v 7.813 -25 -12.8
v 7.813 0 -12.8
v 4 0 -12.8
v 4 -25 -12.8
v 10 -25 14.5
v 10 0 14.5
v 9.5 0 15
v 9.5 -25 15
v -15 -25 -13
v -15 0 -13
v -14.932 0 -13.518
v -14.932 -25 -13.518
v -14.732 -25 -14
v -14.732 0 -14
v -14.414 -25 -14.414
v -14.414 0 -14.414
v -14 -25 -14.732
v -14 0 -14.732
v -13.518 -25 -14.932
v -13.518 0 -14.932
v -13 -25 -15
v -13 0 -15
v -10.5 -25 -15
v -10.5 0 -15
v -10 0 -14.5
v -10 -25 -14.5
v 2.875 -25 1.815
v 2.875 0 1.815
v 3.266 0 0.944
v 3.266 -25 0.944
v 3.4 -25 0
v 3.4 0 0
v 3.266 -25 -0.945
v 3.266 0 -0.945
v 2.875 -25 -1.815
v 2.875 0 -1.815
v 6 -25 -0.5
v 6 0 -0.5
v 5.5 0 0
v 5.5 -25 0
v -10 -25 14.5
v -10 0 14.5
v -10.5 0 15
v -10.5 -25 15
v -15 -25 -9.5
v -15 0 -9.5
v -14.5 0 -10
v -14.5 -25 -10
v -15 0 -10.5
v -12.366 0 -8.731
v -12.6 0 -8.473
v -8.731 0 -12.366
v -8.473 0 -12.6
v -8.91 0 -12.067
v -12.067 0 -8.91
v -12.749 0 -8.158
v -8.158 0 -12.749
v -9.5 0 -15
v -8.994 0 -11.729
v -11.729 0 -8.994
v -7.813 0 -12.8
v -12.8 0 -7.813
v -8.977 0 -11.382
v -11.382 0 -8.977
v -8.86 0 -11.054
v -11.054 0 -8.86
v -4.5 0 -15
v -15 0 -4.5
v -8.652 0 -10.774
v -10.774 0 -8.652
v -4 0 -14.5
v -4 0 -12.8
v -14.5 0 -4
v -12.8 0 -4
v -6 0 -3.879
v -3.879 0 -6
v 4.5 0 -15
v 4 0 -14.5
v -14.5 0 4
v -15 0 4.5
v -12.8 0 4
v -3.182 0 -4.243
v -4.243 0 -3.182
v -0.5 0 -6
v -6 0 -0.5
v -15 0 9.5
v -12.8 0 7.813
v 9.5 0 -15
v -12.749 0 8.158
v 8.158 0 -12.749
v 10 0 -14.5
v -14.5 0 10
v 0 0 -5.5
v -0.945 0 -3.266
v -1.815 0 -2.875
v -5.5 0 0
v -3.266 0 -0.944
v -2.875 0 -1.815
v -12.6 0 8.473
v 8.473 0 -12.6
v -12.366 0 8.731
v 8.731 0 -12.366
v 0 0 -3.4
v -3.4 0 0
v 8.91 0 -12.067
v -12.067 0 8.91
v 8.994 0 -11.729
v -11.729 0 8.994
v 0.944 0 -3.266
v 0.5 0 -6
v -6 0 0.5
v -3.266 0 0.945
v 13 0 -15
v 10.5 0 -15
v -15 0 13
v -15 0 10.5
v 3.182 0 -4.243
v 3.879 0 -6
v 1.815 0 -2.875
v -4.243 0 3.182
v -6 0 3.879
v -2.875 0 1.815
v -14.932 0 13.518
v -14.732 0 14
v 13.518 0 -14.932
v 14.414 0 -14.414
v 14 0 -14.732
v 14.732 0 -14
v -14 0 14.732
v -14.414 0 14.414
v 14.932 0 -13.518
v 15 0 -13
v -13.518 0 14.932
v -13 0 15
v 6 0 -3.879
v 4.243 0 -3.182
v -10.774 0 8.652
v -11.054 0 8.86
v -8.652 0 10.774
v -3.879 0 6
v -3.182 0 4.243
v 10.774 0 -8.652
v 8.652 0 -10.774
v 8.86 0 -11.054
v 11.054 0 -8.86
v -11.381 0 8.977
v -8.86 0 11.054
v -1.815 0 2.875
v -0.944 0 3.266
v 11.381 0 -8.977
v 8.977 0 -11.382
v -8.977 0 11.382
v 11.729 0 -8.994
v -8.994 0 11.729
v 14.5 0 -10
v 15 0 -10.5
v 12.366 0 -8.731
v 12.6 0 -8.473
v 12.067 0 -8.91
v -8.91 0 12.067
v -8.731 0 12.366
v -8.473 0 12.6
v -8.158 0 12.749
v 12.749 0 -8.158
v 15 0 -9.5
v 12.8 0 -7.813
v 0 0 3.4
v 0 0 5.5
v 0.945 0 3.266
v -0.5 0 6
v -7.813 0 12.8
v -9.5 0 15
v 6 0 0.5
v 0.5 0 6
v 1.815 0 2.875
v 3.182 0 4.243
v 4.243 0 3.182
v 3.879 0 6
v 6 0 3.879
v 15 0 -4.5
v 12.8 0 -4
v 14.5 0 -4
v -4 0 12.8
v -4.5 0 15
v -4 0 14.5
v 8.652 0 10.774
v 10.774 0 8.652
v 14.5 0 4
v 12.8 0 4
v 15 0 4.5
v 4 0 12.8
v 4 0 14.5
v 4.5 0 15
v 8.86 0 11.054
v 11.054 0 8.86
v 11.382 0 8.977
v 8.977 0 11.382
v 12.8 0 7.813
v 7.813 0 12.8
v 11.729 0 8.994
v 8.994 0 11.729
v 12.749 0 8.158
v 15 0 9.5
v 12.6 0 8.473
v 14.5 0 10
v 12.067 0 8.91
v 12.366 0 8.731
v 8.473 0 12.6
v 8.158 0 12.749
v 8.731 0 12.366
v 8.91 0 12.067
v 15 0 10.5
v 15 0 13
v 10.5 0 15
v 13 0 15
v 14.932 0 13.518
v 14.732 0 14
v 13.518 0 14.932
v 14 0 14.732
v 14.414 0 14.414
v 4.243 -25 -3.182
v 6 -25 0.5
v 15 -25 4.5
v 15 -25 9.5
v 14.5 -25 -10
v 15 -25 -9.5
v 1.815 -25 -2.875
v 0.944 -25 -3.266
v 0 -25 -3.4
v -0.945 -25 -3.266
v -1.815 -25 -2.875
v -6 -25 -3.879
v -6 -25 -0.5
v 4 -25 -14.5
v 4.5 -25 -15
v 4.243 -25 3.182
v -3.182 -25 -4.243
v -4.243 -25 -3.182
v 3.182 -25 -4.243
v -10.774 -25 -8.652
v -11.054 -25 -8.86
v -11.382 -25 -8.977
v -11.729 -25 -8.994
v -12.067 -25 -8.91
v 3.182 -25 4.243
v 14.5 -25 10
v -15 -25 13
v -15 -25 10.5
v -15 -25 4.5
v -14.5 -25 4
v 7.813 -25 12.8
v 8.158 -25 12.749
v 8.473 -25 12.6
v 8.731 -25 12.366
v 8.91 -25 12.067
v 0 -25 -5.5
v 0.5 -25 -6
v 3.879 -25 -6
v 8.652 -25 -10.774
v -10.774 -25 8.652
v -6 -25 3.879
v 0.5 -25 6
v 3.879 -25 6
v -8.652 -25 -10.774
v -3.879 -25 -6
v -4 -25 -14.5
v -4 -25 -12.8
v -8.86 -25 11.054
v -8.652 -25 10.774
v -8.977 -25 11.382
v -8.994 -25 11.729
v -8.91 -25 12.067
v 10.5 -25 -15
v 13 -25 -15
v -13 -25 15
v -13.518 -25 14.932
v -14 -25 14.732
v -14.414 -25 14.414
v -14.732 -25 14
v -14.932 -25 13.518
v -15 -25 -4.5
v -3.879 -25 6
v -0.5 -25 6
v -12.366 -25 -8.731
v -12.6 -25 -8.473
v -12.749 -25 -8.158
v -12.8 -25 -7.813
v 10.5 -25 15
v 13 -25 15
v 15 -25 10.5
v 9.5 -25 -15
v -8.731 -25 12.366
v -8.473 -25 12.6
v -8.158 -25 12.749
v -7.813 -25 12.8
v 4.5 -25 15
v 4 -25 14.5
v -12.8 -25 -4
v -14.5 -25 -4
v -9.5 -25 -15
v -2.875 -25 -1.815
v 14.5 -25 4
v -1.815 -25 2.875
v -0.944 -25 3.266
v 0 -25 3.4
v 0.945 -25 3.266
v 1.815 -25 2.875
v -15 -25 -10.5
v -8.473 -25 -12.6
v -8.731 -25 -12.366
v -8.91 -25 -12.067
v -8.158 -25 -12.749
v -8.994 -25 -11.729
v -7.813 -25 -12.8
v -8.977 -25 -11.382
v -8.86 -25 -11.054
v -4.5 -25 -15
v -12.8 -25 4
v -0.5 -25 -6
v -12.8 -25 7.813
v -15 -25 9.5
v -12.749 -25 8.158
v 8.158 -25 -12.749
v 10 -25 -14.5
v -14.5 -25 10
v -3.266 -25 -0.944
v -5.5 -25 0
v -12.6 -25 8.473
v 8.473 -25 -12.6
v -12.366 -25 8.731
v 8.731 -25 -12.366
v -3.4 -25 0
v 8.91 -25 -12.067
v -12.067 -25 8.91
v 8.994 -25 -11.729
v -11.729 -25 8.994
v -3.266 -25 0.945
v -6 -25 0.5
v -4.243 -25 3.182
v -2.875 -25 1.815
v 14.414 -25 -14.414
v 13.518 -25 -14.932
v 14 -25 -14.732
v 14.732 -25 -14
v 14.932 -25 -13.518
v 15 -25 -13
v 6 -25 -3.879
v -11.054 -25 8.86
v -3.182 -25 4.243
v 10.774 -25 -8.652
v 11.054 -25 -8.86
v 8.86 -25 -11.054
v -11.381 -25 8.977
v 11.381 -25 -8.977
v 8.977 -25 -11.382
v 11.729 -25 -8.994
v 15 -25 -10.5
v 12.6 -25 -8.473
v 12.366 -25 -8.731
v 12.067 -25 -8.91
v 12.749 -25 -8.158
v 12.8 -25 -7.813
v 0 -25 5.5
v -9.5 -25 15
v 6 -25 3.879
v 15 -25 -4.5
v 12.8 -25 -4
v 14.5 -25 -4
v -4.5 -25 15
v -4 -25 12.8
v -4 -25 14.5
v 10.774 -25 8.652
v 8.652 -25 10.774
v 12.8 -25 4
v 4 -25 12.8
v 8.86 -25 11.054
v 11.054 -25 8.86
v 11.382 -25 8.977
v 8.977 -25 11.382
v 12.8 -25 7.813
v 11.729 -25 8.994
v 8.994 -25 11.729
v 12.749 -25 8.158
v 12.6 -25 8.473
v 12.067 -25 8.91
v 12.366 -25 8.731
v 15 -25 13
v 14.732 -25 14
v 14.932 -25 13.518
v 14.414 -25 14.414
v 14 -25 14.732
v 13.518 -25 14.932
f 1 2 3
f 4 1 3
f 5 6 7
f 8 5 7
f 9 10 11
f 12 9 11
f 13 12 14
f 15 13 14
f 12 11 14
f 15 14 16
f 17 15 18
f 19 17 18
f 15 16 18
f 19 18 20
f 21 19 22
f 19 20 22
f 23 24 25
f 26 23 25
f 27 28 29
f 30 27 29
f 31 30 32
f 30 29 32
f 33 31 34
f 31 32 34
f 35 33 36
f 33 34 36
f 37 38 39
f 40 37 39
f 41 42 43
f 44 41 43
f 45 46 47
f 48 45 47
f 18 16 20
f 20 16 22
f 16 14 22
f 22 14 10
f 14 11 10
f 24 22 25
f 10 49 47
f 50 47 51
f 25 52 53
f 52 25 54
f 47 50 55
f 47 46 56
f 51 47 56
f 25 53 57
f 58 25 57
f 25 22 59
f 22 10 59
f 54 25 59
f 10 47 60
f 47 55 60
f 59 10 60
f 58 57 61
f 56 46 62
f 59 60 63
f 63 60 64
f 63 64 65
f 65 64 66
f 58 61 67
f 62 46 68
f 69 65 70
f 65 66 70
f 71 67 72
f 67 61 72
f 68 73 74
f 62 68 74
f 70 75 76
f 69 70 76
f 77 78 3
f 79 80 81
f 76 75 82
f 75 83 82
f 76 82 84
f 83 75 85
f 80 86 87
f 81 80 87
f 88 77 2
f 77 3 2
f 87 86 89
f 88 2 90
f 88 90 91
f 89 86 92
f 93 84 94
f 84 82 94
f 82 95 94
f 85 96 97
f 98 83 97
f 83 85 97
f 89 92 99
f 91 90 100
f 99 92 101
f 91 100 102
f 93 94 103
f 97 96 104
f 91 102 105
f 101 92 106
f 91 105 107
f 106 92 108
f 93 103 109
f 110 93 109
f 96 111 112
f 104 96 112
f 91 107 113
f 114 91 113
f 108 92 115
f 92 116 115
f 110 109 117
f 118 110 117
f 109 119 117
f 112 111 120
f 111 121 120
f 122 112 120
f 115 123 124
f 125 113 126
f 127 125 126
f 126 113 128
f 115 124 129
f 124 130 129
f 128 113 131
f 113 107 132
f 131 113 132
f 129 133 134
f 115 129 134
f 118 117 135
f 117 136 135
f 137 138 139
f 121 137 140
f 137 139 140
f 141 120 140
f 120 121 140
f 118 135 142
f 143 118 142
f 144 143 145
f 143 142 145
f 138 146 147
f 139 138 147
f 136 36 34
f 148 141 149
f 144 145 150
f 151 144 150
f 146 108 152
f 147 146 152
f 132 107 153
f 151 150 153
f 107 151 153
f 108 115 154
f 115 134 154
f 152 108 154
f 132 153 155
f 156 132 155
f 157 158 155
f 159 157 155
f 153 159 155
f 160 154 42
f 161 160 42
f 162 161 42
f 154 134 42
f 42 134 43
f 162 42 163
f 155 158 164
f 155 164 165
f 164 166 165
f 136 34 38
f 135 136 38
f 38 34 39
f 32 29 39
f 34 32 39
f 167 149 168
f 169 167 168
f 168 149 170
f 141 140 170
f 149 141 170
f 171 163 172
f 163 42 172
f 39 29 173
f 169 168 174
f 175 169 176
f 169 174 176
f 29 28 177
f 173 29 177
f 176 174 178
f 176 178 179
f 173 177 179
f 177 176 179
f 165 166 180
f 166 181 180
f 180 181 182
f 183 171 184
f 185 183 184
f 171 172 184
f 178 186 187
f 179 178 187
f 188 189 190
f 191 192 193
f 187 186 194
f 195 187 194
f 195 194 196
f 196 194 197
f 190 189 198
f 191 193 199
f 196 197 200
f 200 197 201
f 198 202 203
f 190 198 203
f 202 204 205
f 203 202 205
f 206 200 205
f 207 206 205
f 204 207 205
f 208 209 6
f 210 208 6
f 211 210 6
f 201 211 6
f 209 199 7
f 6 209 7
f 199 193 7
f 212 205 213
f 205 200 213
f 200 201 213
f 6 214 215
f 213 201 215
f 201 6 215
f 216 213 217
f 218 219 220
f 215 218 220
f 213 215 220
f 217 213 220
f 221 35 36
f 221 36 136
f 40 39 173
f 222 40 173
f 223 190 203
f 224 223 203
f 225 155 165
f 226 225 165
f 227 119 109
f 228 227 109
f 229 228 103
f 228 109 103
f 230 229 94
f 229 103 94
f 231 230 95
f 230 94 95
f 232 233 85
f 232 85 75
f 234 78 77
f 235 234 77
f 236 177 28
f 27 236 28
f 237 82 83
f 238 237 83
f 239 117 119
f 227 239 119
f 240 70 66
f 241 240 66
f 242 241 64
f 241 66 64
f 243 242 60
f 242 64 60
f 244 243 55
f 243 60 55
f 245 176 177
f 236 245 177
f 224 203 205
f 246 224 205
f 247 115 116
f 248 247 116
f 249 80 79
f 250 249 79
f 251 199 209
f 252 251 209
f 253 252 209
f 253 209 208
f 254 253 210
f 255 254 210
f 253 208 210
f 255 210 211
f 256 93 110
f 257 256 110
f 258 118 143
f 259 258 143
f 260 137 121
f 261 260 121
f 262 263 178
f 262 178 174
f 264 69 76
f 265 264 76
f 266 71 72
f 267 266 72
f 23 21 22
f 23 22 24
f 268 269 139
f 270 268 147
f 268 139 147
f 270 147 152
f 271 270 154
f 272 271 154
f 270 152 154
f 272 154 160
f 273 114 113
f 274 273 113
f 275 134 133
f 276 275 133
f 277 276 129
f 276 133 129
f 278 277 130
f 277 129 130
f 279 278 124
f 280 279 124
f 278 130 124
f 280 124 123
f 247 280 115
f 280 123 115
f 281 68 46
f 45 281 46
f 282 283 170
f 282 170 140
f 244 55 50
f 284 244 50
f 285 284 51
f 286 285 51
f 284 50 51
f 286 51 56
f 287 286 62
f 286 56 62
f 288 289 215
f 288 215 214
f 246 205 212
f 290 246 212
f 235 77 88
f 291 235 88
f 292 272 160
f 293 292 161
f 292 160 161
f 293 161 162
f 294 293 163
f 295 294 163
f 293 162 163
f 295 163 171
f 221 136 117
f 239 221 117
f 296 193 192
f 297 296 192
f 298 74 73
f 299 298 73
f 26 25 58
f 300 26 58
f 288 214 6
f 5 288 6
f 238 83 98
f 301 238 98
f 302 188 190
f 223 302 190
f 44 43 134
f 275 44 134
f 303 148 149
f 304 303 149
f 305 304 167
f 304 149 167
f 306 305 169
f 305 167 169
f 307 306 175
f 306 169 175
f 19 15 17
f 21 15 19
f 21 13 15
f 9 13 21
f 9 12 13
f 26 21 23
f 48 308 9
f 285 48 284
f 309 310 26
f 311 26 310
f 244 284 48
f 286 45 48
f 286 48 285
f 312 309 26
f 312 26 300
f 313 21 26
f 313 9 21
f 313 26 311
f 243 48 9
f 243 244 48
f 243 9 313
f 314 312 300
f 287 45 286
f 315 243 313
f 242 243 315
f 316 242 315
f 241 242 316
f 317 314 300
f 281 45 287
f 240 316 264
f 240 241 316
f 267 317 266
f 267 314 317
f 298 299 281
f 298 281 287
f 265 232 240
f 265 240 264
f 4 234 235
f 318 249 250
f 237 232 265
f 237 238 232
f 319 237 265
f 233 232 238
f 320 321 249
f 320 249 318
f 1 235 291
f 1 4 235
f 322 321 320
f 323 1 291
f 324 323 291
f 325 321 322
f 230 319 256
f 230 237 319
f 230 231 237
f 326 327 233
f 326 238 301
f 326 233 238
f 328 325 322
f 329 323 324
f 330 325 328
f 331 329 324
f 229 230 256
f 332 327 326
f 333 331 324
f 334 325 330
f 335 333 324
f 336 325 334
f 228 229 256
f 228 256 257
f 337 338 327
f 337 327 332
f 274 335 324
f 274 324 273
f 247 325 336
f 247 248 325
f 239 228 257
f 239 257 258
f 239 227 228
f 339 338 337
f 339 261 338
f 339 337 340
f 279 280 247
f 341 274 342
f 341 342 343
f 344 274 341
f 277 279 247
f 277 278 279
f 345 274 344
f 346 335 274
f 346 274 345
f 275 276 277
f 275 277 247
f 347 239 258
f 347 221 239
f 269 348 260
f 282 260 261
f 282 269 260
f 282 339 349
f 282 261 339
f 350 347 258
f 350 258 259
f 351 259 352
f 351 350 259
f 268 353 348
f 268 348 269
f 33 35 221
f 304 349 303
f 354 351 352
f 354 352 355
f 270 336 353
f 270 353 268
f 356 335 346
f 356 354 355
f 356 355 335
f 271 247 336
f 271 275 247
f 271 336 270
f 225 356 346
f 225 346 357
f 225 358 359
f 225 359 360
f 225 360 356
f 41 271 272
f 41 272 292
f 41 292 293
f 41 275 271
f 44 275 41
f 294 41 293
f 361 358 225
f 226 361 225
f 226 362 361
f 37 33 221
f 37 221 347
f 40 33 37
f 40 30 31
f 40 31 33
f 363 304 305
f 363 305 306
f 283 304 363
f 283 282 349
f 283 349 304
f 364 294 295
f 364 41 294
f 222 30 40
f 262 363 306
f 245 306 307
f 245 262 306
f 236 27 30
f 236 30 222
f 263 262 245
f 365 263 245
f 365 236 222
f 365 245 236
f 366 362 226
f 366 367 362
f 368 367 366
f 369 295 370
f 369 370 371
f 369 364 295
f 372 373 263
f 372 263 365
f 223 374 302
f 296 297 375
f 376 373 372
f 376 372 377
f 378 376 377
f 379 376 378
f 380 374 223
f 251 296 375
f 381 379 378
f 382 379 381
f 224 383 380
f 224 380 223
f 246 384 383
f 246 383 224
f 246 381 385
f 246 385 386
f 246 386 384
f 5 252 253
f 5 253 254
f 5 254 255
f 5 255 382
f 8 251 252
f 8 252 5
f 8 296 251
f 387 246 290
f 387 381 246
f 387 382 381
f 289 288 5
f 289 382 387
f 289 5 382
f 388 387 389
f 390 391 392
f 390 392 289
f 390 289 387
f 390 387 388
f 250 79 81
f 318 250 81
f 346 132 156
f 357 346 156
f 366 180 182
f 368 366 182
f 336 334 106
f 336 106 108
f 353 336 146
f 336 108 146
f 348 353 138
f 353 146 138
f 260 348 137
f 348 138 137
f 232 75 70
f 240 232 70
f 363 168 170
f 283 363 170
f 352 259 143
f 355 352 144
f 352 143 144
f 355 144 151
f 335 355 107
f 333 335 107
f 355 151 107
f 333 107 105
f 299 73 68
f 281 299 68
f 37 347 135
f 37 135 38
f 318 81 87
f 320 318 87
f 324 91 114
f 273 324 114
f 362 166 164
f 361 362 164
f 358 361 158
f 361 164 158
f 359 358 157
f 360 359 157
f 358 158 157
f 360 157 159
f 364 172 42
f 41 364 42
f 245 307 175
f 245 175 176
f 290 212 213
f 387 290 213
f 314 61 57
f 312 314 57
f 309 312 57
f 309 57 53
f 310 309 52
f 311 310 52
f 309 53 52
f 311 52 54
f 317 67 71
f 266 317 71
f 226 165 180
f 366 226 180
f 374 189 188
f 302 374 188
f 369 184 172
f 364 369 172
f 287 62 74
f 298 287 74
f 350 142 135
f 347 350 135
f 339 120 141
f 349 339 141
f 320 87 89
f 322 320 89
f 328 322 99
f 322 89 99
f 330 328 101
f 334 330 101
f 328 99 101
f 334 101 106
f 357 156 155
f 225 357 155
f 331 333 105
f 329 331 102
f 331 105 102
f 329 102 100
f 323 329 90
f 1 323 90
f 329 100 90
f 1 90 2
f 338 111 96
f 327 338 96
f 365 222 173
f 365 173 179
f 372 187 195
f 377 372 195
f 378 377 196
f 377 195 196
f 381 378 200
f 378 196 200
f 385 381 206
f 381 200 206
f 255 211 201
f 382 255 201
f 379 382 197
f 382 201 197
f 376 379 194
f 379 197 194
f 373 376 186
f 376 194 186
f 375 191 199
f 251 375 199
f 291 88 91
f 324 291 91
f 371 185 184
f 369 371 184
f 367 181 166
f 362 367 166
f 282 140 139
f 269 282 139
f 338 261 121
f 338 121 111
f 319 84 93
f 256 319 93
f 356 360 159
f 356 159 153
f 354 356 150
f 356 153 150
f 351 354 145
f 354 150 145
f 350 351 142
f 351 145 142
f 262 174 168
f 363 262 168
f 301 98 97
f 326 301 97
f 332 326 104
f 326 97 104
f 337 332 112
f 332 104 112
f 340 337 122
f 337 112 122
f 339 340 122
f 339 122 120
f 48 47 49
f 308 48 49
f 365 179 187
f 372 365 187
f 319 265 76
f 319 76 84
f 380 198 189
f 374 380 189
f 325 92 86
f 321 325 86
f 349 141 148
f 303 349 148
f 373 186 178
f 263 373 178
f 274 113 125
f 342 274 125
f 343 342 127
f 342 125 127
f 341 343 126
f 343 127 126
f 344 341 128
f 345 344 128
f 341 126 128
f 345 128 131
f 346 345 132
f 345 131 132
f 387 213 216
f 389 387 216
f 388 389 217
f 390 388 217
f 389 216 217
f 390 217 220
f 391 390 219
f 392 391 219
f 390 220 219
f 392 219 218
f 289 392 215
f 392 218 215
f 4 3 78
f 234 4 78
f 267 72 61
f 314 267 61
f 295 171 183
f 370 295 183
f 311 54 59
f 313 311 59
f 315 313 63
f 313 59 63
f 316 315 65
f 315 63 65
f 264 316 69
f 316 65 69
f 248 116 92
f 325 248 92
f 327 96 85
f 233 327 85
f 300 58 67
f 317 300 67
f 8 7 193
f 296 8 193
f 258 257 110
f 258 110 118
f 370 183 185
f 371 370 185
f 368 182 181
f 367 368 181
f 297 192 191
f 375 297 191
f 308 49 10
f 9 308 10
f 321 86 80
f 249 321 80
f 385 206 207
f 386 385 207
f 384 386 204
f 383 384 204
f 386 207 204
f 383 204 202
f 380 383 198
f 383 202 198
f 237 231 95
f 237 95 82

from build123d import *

# Parameters (mm, degrees)
F1_DEPTH = 25


# Not quite as in the source:
# - ends of sketch curves that miss each other by under 0.0002 mm in the source are joined


with BuildPart() as f1:
    # F0 (on Front) → F1 (new body)
    with BuildSketch(Plane.XZ):
        with BuildLine():
            ThreePointArc((-12.0672760652, 8.9096491574), (-11.3814883912, 8.9771930389), (-10.7737513132, 8.6523506868))
            Line((-10.7737513132, 8.6523506868), (-6, 3.8786))
            Line((-6, 3.8786), (-6, 0.5))
            Line((-6, 0.5), (-5.5, 0))
            Line((-5.5, 0), (-6, -0.5))
            Line((-6, -0.5), (-6, -3.8786))
            Line((-6, -3.8786), (-10.7738, -8.6524))
            ThreePointArc((-10.7738, -8.6524), (-11.3814883912, -8.9771930389), (-12.0672760652, -8.9096491574))
            ThreePointArc((-12.0672760652, -8.9096491574), (-12.5999492171, -8.4725051968), (-12.799999999, -7.8131))
            Line((-12.799999999, -7.8131), (-12.8, -4))
            Line((-12.8, -4), (-14.5, -4))
            Line((-14.5, -4), (-15, -4.5))
            Line((-15, -4.5), (-15, -9.5))
            Line((-15, -9.5), (-14.5, -10))
            Line((-14.5, -10), (-15, -10.5))
            Line((-15, -10.5), (-15, -13))
            ThreePointArc((-15, -13), (-14.4141844722, -14.4142216524), (-13, -15.0000239995))
            Line((-13, -15.0000239995), (-10.5, -15))
            Line((-10.5, -15), (-10, -14.5))
            Line((-10, -14.5), (-9.5, -15))
            Line((-9.5, -15), (-4.5, -15))
            Line((-4.5, -15), (-4, -14.5))
            Line((-4, -14.5), (-4, -12.8))
            Line((-4, -12.8), (-7.8131, -12.8))
            ThreePointArc((-7.8131, -12.8), (-8.4725048128, -12.5999494737), (-8.9096488038, -12.0672769187))
            ThreePointArc((-8.9096488038, -12.0672769187), (-8.977199798, -11.3815223738), (-8.6523996854, -10.7738003146))
            Line((-8.6523996854, -10.7738003146), (-3.8786, -6))
            Line((-3.8786, -6), (-0.5, -6))
            Line((-0.5, -6), (0, -5.5))
            Line((0, -5.5), (0.5, -6))
            Line((0.5, -6), (3.8786, -6))
            Line((3.8786, -6), (8.6524, -10.7738))
            ThreePointArc((8.6524, -10.7738), (8.977199798, -11.3815223738), (8.9096491574, -12.0672760652))
            ThreePointArc((8.9096491574, -12.0672760652), (8.4725048128, -12.5999494737), (7.8131, -12.799999999))
            Line((7.8131, -12.799999999), (4, -12.8))
            Line((4, -12.8), (4, -14.5))
            Line((4, -14.5), (4.5, -15))
            Line((4.5, -15), (9.5, -15))
            Line((9.5, -15), (10, -14.5))
            Line((10, -14.5), (10.5, -15))
            Line((10.5, -15), (13, -15))
            ThreePointArc((13, -15), (14.4141844722, -14.4142216524), (14.999955, -13.000024))
            Line((14.999955, -13.000024), (15, -10.5))
            Line((15, -10.5), (14.5, -10))
            Line((14.5, -10), (15, -9.5))
            Line((15, -9.5), (15, -4.5))
            Line((15, -4.5), (14.5, -4))
            Line((14.5, -4), (12.8, -4))
            Line((12.8, -4), (12.8, -7.8131))
            ThreePointArc((12.8, -7.8131), (12.5999492171, -8.4725051968), (12.0672760652, -8.9096491574))
            ThreePointArc((12.0672760652, -8.9096491574), (11.3814883912, -8.9771930389), (10.7737513132, -8.6523506868))
            Line((10.7737513132, -8.6523506868), (6, -3.8786))
            Line((6, -3.8786), (6, -0.5))
            Line((6, -0.5), (5.5, 0))
            Line((5.5, 0), (6, 0.5))
            Line((6, 0.5), (6, 3.8786))
            Line((6, 3.8786), (10.7738, 8.6524))
            ThreePointArc((10.7738, 8.6524), (11.3814883912, 8.9771930389), (12.0672760652, 8.9096491574))
            ThreePointArc((12.0672760652, 8.9096491574), (12.5999492171, 8.4725051968), (12.799999999, 7.8131))
            Line((12.799999999, 7.8131), (12.8, 4))
            Line((12.8, 4), (14.5, 4))
            Line((14.5, 4), (15, 4.5))
            Line((15, 4.5), (15, 9.5))
            Line((15, 9.5), (14.5, 10))
            Line((14.5, 10), (15, 10.5))
            Line((15, 10.5), (15, 13))
            ThreePointArc((15, 13), (14.4141844722, 14.4142216524), (13, 15.0000239995))
            Line((13, 15.0000239995), (10.5, 15))
            Line((10.5, 15), (10, 14.5))
            Line((10, 14.5), (9.5, 15))
            Line((9.5, 15), (4.5, 15))
            Line((4.5, 15), (4, 14.5))
            Line((4, 14.5), (4, 12.8))
            Line((4, 12.8), (7.8131, 12.8))
            ThreePointArc((7.8131, 12.8), (8.4725048128, 12.5999494737), (8.9096488038, 12.0672769187))
            ThreePointArc((8.9096488038, 12.0672769187), (8.977199798, 11.3815223738), (8.6523996854, 10.7738003146))
            Line((8.6523996854, 10.7738003146), (3.8786, 6))
            Line((3.8786, 6), (0.5, 6))
            Line((0.5, 6), (0, 5.5))
            Line((0, 5.5), (-0.5, 6))
            Line((-0.5, 6), (-3.8786, 6))
            Line((-3.8786, 6), (-8.6524, 10.7738))
            ThreePointArc((-8.6524, 10.7738), (-8.977199798, 11.3815223738), (-8.9096491574, 12.0672760652))
            ThreePointArc((-8.9096491574, 12.0672760652), (-8.4725048128, 12.5999494737), (-7.8131, 12.799999999))
            Line((-7.8131, 12.799999999), (-4, 12.8))
            Line((-4, 12.8), (-4, 14.5))
            Line((-4, 14.5), (-4.5, 15))
            Line((-4.5, 15), (-9.5, 15))
            Line((-9.5, 15), (-10, 14.5))
            Line((-10, 14.5), (-10.5, 15))
            Line((-10.5, 15), (-13, 15))
            ThreePointArc((-13, 15), (-14.4141844722, 14.4142216524), (-14.999955, 13.000024))
            Line((-14.999955, 13.000024), (-15, 10.5))
            Line((-15, 10.5), (-14.5, 10))
            Line((-14.5, 10), (-15, 9.5))
            Line((-15, 9.5), (-15, 4.5))
            Line((-15, 4.5), (-14.5, 4))
            Line((-14.5, 4), (-12.8, 4))
            Line((-12.8, 4), (-12.8, 7.8131))
            ThreePointArc((-12.8, 7.8131), (-12.5999492171, 8.4725051968), (-12.0672760652, 8.9096491574))
        make_face()
        with BuildLine():
            Line((-4.2426, -3.182), (-2.8752, -1.8146))
            ThreePointArc((-2.8752, -1.8146), (-3.4, 0), (-2.8752481958, 1.8146481236))
            Line((-2.8752481958, 1.8146481236), (-4.2426, 3.182))
            Line((-4.2426, 3.182), (-3.182, 4.2426))
            Line((-3.182, 4.2426), (-1.8146, 2.8752))
            ThreePointArc((-1.8146, 2.8752), (0, 3.4), (1.8146481236, 2.8752481958))
            Line((1.8146481236, 2.8752481958), (3.182, 4.2426))
            Line((3.182, 4.2426), (4.2426, 3.182))
            Line((4.2426, 3.182), (2.8752, 1.8146))
            ThreePointArc((2.8752, 1.8146), (3.4, 0), (2.8752481958, -1.8146481236))
            Line((2.8752481958, -1.8146481236), (4.2426, -3.182))
            Line((4.2426, -3.182), (3.182, -4.2426))
            Line((3.182, -4.2426), (1.8146, -2.8752))
            ThreePointArc((1.8146, -2.8752), (0, -3.4), (-1.8146481236, -2.8752481958))
            Line((-1.8146481236, -2.8752481958), (-3.182, -4.2426))
            Line((-3.182, -4.2426), (-4.2426, -3.182))
        make_face(mode=Mode.SUBTRACT)
    extrude(amount=F1_DEPTH)


solid = f1.part
